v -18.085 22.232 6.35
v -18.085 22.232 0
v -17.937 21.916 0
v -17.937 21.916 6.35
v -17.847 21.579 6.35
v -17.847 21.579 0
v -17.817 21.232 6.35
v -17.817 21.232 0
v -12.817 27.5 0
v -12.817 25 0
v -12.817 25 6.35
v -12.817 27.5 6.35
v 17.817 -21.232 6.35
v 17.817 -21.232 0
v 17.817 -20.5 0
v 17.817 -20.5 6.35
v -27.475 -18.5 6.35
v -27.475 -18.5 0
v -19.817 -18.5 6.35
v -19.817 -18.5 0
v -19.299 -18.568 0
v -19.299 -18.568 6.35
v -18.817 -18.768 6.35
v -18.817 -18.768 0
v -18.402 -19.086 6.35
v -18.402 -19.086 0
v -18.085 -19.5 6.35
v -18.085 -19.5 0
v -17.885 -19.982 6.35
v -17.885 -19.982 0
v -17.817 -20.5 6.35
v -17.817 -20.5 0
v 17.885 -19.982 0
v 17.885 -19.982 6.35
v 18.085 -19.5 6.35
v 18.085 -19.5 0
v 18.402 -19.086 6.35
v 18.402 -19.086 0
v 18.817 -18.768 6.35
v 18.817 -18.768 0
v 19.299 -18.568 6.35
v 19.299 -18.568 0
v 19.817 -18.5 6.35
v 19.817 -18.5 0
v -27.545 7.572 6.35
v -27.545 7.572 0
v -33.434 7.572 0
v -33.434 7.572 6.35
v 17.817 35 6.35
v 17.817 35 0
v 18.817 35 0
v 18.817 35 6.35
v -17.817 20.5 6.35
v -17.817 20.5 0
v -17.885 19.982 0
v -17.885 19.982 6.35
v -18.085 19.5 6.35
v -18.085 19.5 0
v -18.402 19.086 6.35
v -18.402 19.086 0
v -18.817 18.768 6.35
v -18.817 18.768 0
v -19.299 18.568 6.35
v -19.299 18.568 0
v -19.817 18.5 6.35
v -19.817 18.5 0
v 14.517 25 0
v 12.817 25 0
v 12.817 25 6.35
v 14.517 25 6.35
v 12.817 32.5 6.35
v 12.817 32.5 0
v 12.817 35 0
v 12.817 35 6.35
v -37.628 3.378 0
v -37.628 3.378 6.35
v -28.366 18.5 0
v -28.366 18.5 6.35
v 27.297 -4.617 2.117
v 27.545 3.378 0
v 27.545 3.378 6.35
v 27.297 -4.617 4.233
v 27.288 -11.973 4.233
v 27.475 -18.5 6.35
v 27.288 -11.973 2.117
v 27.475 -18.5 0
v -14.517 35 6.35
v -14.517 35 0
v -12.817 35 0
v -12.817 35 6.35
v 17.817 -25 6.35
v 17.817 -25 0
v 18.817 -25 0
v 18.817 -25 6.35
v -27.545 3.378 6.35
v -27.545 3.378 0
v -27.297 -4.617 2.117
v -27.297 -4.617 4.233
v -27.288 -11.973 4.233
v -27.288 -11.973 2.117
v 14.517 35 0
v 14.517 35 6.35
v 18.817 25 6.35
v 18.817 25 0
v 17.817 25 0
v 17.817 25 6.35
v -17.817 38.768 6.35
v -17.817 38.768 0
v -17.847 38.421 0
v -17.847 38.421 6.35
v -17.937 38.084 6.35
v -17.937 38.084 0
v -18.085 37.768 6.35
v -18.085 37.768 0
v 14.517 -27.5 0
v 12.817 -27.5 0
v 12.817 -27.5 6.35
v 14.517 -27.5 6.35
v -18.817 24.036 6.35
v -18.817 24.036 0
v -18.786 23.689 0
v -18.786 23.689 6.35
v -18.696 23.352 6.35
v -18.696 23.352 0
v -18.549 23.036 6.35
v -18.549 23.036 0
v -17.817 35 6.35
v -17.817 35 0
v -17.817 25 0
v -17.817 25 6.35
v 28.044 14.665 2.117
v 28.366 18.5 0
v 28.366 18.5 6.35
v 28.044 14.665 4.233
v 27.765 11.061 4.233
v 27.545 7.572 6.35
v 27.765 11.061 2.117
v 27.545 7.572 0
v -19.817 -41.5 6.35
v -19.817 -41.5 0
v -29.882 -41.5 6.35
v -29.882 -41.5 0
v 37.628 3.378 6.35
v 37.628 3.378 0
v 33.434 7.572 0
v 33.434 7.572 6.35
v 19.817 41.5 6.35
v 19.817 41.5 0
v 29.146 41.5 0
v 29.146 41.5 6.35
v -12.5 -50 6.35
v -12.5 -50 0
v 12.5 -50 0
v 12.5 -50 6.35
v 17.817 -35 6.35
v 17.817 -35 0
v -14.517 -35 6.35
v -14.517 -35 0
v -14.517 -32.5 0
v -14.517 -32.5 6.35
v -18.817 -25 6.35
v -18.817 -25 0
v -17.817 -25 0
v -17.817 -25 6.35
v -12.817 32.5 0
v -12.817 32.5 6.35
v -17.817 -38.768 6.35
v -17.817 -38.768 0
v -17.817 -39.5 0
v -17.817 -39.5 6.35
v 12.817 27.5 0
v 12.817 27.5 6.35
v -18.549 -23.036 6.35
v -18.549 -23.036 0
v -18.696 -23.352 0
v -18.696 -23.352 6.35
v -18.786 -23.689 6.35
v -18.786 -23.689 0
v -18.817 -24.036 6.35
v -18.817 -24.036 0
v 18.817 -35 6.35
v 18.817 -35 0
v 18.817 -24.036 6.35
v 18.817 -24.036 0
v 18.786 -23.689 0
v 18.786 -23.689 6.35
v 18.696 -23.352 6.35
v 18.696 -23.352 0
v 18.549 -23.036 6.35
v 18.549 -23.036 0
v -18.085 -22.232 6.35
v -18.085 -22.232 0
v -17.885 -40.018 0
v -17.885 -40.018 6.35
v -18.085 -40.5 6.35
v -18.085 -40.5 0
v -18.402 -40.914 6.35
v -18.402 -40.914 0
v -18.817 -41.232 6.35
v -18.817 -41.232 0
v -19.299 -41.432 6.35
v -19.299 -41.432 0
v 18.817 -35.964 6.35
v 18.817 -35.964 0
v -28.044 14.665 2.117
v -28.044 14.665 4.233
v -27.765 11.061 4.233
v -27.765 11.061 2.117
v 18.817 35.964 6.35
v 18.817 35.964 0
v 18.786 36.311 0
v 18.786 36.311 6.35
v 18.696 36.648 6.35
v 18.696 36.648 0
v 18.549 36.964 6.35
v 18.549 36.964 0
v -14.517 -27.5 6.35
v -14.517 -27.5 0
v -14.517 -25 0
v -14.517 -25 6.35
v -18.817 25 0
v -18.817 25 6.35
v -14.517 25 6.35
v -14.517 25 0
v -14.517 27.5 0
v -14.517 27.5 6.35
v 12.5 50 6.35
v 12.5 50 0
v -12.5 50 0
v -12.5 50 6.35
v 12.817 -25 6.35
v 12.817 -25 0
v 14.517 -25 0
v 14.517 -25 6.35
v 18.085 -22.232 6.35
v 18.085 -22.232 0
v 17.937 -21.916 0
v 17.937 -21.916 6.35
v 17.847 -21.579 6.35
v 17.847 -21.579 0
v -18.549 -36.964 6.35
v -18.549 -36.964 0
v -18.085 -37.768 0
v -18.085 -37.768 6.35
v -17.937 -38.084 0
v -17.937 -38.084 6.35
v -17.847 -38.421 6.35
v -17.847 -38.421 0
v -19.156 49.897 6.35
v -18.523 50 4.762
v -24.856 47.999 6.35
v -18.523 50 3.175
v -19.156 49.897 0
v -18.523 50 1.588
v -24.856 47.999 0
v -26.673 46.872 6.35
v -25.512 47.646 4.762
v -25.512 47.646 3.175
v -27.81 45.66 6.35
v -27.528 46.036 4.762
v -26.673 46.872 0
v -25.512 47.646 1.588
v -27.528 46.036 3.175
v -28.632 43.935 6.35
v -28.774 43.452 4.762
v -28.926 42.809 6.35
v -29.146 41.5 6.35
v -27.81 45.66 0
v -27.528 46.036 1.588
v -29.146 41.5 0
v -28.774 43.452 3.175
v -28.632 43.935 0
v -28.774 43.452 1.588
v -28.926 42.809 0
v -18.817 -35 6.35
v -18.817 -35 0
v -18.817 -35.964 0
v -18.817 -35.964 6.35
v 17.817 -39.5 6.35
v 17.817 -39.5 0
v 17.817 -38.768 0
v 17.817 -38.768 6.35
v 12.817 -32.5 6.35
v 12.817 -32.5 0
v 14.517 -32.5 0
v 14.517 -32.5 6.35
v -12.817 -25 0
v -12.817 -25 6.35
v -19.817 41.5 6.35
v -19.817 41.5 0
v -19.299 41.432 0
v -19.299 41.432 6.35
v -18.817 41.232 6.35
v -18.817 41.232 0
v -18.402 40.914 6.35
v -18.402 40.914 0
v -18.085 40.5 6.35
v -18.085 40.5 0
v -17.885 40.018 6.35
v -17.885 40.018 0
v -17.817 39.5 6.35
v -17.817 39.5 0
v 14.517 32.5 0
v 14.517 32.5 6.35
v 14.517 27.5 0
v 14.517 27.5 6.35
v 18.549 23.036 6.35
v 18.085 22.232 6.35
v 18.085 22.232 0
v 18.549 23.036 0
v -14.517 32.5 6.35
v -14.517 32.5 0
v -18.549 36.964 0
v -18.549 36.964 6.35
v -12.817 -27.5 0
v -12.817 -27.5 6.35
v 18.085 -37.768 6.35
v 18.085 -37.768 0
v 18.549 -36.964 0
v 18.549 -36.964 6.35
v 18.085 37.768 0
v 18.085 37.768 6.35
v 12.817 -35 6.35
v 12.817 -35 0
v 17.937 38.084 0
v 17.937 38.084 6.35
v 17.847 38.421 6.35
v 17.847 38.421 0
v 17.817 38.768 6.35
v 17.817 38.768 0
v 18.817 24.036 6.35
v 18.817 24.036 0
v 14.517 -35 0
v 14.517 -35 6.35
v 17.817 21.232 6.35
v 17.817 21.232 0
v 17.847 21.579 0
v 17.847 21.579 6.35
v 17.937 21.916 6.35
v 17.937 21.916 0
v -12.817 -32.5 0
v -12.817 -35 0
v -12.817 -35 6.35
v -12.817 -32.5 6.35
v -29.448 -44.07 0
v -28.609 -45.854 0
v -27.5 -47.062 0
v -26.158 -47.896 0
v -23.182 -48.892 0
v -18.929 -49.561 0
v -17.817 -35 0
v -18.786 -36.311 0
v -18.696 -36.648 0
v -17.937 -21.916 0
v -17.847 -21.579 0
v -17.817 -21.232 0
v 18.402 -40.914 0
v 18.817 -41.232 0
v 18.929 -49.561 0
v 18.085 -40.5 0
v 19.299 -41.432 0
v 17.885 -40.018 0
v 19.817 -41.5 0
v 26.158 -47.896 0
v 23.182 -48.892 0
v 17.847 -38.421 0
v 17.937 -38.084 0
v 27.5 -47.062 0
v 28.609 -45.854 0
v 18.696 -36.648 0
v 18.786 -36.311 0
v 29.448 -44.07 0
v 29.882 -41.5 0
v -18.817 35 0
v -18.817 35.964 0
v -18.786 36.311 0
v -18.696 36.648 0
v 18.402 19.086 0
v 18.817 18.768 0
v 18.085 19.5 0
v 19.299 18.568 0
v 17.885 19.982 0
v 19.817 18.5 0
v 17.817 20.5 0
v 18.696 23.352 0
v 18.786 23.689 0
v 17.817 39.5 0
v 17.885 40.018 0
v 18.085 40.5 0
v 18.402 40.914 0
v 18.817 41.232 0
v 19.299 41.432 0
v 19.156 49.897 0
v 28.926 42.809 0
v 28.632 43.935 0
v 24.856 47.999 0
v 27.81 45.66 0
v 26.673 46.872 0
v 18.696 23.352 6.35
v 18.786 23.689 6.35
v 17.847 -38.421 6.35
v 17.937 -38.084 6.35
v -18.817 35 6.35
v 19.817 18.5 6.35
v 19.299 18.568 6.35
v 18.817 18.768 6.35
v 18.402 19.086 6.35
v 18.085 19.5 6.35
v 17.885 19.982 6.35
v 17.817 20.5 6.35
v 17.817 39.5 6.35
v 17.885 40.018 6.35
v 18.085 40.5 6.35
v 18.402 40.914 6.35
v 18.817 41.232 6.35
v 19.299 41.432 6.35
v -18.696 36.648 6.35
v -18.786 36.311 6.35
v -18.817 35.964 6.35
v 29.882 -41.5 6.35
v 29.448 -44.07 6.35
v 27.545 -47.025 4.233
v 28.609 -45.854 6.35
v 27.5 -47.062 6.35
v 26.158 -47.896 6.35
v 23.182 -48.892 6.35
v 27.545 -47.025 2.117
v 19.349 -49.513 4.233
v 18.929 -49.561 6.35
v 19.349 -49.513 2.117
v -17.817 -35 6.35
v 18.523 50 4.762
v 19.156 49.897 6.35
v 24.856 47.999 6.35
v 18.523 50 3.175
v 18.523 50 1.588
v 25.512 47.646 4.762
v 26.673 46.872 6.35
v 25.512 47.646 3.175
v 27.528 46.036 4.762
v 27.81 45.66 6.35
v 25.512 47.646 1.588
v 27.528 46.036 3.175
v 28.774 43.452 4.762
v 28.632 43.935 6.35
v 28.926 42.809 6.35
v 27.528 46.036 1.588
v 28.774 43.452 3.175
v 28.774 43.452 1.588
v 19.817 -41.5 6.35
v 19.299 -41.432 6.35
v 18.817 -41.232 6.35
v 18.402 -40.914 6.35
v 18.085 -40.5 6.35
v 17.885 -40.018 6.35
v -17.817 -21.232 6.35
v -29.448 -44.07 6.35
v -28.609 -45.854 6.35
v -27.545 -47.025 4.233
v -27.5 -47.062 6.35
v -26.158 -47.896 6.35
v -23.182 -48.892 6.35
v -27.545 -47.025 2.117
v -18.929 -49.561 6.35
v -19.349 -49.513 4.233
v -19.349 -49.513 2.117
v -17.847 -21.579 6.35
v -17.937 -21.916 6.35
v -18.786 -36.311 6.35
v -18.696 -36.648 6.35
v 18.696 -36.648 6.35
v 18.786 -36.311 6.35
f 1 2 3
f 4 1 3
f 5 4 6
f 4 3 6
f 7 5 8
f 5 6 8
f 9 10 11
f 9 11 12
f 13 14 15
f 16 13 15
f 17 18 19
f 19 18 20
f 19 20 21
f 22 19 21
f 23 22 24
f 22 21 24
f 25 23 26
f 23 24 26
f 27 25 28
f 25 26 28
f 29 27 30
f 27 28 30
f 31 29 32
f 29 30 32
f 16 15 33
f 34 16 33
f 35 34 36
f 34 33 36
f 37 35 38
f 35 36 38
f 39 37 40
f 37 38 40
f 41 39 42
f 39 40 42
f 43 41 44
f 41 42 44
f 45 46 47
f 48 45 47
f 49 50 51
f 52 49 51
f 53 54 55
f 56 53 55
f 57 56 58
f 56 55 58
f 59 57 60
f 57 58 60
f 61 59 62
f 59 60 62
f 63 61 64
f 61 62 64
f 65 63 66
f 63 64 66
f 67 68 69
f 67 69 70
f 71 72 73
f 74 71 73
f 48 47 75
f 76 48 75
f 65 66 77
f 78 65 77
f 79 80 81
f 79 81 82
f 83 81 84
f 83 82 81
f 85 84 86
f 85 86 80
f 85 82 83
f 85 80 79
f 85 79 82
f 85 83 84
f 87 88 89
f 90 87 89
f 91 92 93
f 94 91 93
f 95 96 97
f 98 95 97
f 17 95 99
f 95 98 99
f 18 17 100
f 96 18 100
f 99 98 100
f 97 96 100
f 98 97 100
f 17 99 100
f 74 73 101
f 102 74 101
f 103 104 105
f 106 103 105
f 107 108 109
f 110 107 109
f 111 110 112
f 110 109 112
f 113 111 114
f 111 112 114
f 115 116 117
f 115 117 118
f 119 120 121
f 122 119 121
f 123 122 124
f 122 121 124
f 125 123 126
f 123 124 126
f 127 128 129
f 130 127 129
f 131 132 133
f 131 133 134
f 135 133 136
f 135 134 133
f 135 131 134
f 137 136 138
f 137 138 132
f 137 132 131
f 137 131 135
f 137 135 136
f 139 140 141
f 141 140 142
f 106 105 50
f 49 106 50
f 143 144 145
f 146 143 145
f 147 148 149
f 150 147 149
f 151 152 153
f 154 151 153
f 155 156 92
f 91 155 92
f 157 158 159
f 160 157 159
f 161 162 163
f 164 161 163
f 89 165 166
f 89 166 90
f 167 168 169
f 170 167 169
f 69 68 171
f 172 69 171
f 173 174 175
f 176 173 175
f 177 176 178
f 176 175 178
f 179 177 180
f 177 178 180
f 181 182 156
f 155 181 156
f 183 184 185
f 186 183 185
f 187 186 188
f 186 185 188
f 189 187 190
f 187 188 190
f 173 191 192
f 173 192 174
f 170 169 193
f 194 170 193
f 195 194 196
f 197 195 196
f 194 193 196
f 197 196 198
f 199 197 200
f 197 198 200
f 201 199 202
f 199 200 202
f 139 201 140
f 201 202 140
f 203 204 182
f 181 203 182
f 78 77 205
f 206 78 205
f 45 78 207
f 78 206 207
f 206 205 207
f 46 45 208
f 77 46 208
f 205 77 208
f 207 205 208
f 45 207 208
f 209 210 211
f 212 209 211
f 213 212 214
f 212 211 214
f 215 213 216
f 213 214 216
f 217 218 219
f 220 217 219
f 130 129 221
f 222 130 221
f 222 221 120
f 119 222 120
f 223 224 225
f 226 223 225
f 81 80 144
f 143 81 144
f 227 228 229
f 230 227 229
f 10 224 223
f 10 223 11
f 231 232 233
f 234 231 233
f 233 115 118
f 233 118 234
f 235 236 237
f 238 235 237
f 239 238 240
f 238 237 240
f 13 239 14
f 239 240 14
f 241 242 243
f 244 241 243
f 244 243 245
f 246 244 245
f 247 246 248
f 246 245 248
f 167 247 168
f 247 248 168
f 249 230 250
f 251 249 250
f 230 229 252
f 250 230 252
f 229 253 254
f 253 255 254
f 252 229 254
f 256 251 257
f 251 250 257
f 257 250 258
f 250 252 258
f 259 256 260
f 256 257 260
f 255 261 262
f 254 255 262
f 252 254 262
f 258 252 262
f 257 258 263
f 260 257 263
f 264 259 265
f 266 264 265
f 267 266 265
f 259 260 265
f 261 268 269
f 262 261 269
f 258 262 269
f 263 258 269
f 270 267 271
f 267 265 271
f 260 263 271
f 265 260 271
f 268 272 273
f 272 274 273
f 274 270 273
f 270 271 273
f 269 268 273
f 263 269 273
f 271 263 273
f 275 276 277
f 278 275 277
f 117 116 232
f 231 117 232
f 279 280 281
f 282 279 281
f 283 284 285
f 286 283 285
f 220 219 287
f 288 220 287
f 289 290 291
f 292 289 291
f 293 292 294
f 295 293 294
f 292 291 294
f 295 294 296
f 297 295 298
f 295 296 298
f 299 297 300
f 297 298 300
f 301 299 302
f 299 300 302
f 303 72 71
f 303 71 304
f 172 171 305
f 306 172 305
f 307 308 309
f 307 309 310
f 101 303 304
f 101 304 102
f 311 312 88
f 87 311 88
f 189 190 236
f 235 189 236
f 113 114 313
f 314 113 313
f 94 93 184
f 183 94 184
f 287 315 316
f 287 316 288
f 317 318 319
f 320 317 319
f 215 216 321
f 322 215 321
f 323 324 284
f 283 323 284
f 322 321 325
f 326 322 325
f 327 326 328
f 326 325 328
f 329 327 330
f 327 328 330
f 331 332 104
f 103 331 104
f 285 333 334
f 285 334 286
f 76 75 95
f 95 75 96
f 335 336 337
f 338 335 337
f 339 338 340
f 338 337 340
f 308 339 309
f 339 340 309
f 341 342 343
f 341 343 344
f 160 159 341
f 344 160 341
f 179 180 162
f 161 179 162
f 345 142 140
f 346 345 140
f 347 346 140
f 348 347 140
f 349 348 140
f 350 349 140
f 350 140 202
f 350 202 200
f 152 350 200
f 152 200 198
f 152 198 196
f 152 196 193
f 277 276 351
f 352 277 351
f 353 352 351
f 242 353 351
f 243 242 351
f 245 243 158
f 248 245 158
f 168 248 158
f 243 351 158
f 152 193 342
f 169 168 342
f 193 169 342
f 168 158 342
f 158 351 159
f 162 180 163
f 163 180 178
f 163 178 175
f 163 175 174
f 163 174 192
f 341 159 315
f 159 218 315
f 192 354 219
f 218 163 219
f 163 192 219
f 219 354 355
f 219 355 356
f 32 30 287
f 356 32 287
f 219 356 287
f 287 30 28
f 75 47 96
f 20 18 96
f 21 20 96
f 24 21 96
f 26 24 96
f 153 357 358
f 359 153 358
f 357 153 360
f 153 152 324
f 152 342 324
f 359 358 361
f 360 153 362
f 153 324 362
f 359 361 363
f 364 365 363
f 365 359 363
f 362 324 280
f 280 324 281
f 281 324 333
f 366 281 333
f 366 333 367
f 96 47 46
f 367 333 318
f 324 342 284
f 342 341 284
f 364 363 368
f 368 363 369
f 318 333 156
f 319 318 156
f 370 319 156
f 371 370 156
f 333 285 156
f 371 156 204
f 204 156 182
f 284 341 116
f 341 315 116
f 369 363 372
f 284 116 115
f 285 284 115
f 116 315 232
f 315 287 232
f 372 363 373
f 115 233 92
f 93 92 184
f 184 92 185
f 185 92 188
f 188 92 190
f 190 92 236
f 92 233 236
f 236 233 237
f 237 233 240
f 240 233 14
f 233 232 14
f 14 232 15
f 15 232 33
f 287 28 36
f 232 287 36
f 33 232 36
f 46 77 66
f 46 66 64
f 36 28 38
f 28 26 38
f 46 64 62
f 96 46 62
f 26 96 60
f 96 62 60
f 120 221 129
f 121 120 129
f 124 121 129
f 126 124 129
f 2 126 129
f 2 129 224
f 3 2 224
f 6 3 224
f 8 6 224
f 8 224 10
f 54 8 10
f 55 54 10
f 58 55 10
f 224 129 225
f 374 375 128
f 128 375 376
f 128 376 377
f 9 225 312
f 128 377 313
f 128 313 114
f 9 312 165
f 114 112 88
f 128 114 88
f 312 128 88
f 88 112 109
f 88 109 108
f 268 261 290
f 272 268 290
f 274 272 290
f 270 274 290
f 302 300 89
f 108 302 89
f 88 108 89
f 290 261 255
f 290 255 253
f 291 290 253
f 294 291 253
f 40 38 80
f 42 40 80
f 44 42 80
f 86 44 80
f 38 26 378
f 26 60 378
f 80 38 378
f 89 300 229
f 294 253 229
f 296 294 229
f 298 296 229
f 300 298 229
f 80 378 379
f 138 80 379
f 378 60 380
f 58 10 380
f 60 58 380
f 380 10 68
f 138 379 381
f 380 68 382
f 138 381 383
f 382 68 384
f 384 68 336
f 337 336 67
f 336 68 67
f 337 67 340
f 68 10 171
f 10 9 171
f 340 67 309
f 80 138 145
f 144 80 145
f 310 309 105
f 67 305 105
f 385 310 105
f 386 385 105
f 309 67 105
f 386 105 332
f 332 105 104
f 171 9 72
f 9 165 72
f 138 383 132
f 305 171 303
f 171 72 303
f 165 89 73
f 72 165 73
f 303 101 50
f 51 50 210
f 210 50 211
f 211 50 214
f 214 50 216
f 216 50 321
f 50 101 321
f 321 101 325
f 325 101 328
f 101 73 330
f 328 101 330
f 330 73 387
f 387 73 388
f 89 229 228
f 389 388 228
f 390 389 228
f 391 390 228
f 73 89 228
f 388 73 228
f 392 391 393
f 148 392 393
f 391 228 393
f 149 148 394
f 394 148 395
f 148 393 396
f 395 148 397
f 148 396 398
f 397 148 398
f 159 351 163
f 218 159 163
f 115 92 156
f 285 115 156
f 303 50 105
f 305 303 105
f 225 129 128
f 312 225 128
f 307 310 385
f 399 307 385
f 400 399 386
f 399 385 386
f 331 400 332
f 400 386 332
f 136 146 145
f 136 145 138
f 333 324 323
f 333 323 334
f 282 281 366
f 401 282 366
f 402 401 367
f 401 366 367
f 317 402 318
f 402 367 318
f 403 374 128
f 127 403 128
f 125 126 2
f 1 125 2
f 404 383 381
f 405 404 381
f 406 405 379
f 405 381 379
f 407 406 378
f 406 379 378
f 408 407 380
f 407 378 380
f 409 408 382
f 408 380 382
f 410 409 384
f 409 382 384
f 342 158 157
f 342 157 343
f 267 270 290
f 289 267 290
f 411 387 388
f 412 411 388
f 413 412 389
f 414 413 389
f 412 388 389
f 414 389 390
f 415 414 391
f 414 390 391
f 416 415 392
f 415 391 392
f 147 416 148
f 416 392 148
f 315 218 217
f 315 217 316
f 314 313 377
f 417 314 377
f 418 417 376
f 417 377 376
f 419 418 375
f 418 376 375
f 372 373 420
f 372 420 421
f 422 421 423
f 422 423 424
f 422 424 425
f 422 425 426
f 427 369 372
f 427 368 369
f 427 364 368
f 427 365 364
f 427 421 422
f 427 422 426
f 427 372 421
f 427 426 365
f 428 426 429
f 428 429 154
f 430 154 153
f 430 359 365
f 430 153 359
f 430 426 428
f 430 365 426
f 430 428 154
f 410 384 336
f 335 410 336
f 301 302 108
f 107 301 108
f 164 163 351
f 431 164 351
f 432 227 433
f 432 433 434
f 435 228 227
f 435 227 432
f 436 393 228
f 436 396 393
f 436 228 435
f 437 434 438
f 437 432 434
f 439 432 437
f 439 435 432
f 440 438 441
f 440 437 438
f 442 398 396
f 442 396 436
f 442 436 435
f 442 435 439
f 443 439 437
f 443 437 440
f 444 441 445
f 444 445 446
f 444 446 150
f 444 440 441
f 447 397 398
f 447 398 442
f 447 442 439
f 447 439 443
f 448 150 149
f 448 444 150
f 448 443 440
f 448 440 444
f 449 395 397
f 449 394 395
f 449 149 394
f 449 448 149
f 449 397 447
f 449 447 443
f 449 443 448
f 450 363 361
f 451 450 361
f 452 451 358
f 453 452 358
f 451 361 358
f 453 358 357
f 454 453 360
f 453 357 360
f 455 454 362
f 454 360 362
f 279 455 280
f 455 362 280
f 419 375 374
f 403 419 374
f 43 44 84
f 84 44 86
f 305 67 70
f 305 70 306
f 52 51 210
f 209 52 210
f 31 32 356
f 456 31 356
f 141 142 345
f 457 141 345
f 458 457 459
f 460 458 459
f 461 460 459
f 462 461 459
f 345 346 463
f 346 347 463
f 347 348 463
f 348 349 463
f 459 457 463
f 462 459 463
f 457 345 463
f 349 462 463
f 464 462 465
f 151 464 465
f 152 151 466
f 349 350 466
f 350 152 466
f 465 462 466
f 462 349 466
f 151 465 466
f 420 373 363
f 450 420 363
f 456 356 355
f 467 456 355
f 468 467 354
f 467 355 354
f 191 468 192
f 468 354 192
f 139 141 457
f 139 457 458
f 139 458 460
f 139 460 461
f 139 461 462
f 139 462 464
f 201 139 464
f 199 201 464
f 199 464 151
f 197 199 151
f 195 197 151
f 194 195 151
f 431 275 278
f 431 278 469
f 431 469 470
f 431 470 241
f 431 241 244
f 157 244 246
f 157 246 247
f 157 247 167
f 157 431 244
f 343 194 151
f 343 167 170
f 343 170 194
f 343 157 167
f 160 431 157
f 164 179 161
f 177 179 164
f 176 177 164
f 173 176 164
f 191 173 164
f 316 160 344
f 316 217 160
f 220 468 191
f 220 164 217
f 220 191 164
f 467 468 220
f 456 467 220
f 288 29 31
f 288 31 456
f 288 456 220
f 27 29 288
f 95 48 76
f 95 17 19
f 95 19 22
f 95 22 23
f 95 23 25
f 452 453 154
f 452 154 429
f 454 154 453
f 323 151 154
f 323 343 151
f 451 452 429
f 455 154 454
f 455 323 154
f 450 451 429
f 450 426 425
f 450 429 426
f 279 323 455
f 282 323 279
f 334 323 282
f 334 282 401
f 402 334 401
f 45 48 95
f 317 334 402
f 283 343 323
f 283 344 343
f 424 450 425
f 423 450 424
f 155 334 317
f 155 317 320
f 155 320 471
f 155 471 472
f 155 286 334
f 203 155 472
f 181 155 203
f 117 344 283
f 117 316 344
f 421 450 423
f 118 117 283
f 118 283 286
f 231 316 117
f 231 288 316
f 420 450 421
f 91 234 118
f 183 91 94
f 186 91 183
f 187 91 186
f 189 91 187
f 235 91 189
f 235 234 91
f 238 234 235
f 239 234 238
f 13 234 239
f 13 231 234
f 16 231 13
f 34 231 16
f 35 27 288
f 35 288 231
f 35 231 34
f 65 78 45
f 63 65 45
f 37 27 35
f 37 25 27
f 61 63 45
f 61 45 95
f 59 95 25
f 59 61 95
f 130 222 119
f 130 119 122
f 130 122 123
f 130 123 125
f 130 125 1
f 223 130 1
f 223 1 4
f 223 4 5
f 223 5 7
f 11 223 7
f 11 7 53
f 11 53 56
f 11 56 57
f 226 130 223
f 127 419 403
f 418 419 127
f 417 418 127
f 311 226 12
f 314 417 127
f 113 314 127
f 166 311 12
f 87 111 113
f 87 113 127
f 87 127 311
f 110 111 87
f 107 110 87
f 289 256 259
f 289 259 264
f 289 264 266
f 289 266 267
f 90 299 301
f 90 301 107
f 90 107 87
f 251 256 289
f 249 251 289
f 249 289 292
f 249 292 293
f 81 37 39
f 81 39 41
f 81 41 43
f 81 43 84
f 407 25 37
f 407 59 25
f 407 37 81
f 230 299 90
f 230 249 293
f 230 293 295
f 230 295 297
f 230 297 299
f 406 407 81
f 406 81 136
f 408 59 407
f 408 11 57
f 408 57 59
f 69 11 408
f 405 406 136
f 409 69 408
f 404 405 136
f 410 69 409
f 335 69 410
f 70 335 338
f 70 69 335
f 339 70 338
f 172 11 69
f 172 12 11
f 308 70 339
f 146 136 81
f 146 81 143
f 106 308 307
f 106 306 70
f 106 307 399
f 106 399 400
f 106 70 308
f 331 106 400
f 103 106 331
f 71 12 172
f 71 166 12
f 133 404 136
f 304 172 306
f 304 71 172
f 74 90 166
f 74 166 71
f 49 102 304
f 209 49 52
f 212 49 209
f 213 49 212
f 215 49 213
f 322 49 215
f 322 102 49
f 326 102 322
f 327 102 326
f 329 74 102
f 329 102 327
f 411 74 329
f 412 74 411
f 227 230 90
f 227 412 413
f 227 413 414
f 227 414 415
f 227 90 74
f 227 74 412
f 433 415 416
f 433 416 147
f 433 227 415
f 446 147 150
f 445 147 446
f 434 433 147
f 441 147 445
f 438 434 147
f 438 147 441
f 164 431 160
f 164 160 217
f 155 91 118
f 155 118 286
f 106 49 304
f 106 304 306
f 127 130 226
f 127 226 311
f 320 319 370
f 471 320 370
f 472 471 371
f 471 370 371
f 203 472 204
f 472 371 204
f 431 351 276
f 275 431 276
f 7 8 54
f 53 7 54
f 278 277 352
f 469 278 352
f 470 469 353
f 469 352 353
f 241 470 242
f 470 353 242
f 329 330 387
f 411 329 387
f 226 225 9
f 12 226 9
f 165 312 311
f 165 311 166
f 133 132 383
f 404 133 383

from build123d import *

# Parameters (mm, degrees)
F1_W     = 1.7
F1_H     = 2.5
F2_DEPTH = 6.35


# Not quite as in the source:
# - a feature names something its author has since deleted; it is built from what else it names


with BuildPart() as f2:
    # F1 (on Top) → F2 (new body)
    with BuildSketch(Plane.XY):
        with BuildLine():
            add(Edge.make_bspline(
                [(-28.3662502266, 18.5), (-28.0282859794, 14.509768022), (-27.7307294384, 11.0425580188), (-27.5446102023, 7.5721158646)],
                knots=[0.8198316729, 0.8198316729, 0.8198316729, 0.8198316729, 1, 1, 1, 1], degree=3))
            Line((-27.5446102023, 7.5721158646), (-33.4338024259, 7.5721158646))
            Line((-33.4338024259, 7.5721158646), (-37.6275889575, 3.3783284016))
            Line((-37.6275889575, 3.3783284016), (-27.5446102023, 3.3783284016))
            add(Edge.make_bspline(
                [(-27.5446102023, 3.3783284016), (-27.1626822342, -4.8739274421), (-27.2042266074, -12.4503556404), (-27.4753266797, -18.5)],
                knots=[0, 0, 0, 0, 0.2300812655, 0.2300812655, 0.2300812655, 0.2300812655], degree=3))
            Line((-27.4753266797, -18.5), (-19.8166404351, -18.5))
            ThreePointArc((-19.8166404351, -18.5), (-18.4024268727, -19.0857864376), (-17.8166404351, -20.5))
            Line((-17.8166404351, -20.5), (-17.8166404351, -21.2320508076))
            ThreePointArc((-17.8166404351, -21.2320508076), (-17.8847887825, -21.7496888978), (-18.0845896275, -22.2320508076))
            Line((-18.0845896275, -22.2320508076), (-18.5486912426, -23.0358983849))
            ThreePointArc((-18.5486912426, -23.0358983849), (-18.7484920877, -23.5182602947), (-18.8166404351, -24.0358983849))
            Line((-18.8166404351, -24.0358983849), (-18.8166404351, -25))
            Line((-18.8166404351, -25), (-17.8166404351, -25))
            Line((-17.8166404351, -25), (-17.8166404351, -30))
            Line((-17.8166404351, -30), (-17.8166404351, -35))
            Line((-17.8166404351, -35), (-18.8166404351, -35))
            Line((-18.8166404351, -35), (-18.8166404351, -35.9641016151))
            ThreePointArc((-18.8166404351, -35.9641016151), (-18.7484920877, -36.4817397053), (-18.5486912426, -36.9641016151))
            Line((-18.5486912426, -36.9641016151), (-18.0845896275, -37.7679491924))
            ThreePointArc((-18.0845896275, -37.7679491924), (-17.8847887825, -38.2503111022), (-17.8166404351, -38.7679491924))
            Line((-17.8166404351, -38.7679491924), (-17.8166404351, -39.5))
            ThreePointArc((-17.8166404351, -39.5), (-18.4024268727, -40.9142135624), (-19.8166404351, -41.5))
            Line((-19.8166404351, -41.5), (-29.8822661517, -41.5))
            add(Edge.make_bspline(
                [(-29.8822661517, -41.5), (-29.7521644168, -43.7295834581), (-28.3532415217, -48.2000718925), (-19.0537112462, -49.6748582384), (-14.8830911746, -49.9236971311), (-12.5, -50)],
                knots=[0.5930961397, 0.5930961397, 0.5930961397, 0.5930961397, 0.7144689073, 0.865116052, 1, 1, 1, 1], degree=3))
            Line((-12.5, -50), (12.5, -50))
            add(Edge.make_bspline(
                [(29.8822661517, -41.5), (29.7521644168, -43.7295834581), (28.3532415217, -48.2000718925), (19.0537112462, -49.6748582384), (14.8830911746, -49.9236971311), (12.5, -50)],
                knots=[0.5930961397, 0.5930961397, 0.5930961397, 0.5930961397, 0.7144689073, 0.865116052, 1, 1, 1, 1], degree=3))
            Line((29.8822661517, -41.5), (19.8166404351, -41.5))
            ThreePointArc((19.8166404351, -41.5), (18.4024268727, -40.9142135624), (17.8166404351, -39.5))
            Line((17.8166404351, -39.5), (17.8166404351, -38.7679491924))
            ThreePointArc((17.8166404351, -38.7679491924), (17.8847887825, -38.2503111022), (18.0845896275, -37.7679491924))
            Line((18.0845896275, -37.7679491924), (18.5486912426, -36.9641016151))
            ThreePointArc((18.5486912426, -36.9641016151), (18.7484920877, -36.4817397053), (18.8166404351, -35.9641016151))
            Line((18.8166404351, -35.9641016151), (18.8166404351, -35))
            Line((18.8166404351, -35), (17.8166404351, -35))
            Line((17.8166404351, -35), (17.8166404351, -30))
            Line((17.8166404351, -30), (17.8166404351, -25))
            Line((17.8166404351, -25), (18.8166404351, -25))
            Line((18.8166404351, -25), (18.8166404351, -24.0358983849))
            ThreePointArc((18.8166404351, -24.0358983849), (18.7484920877, -23.5182602947), (18.5486912426, -23.0358983849))
            Line((18.5486912426, -23.0358983849), (18.0845896275, -22.2320508076))
            ThreePointArc((18.0845896275, -22.2320508076), (17.8847887825, -21.7496888978), (17.8166404351, -21.2320508076))
            Line((17.8166404351, -21.2320508076), (17.8166404351, -20.5))
            ThreePointArc((17.8166404351, -20.5), (18.4024268727, -19.0857864376), (19.8166404351, -18.5))
            Line((19.8166404351, -18.5), (27.4753266797, -18.5))
            add(Edge.make_bspline(
                [(27.5446102023, 3.3783284016), (27.1626822342, -4.8739274421), (27.2042266074, -12.4503556404), (27.4753266797, -18.5)],
                knots=[0, 0, 0, 0, 0.2300812655, 0.2300812655, 0.2300812655, 0.2300812655], degree=3))
            Line((27.5446102023, 3.3783284016), (37.6275889575, 3.3783284016))
            Line((37.6275889575, 3.3783284016), (33.4338024259, 7.5721158646))
            Line((33.4338024259, 7.5721158646), (27.5446102023, 7.5721158646))
            add(Edge.make_bspline(
                [(28.3662502266, 18.5), (28.0282859794, 14.509768022), (27.7307294384, 11.0425580188), (27.5446102023, 7.5721158646)],
                knots=[0.8198316729, 0.8198316729, 0.8198316729, 0.8198316729, 1, 1, 1, 1], degree=3))
            Line((28.3662502266, 18.5), (19.8166404351, 18.5))
            ThreePointArc((19.8166404351, 18.5), (18.4024268727, 19.0857864376), (17.8166404351, 20.5))
            Line((17.8166404351, 20.5), (17.8166404351, 21.2320508076))
            ThreePointArc((17.8166404351, 21.2320508076), (17.8847887825, 21.7496888978), (18.0845896275, 22.2320508076))
            Line((18.0845896275, 22.2320508076), (18.5486912426, 23.0358983849))
            ThreePointArc((18.5486912426, 23.0358983849), (18.7484920877, 23.5182602947), (18.8166404351, 24.0358983849))
            Line((18.8166404351, 24.0358983849), (18.8166404351, 25))
            Line((18.8166404351, 25), (17.8166404351, 25))
            Line((17.8166404351, 25), (17.8166404351, 30))
            Line((17.8166404351, 30), (17.8166404351, 35))
            Line((17.8166404351, 35), (18.8166404351, 35))
            Line((18.8166404351, 35), (18.8166404351, 35.9641016151))
            ThreePointArc((18.8166404351, 35.9641016151), (18.7484920877, 36.4817397053), (18.5486912426, 36.9641016151))
            Line((18.5486912426, 36.9641016151), (18.0845896275, 37.7679491924))
            ThreePointArc((18.0845896275, 37.7679491924), (17.8847887825, 38.2503111022), (17.8166404351, 38.7679491924))
            Line((17.8166404351, 38.7679491924), (17.8166404351, 39.5))
            ThreePointArc((17.8166404351, 39.5), (18.4024268727, 40.9142135624), (19.8166404351, 41.5))
            Line((19.8166404351, 41.5), (29.1458233545, 41.5))
            add(Edge.make_bspline(
                [(12.5, 50), (14.4284018661, 50.1560744709), (18.4905820055, 50.4849939867), (25.8883531216, 47.9554177216), (28.4554923405, 45.4024265549), (29.0501411907, 42.2200084299), (29.1458233545, 41.5)],
                knots=[0, 0, 0, 0, 0.1539827529, 0.3243842758, 0.4690112538, 0.5065425276, 0.5065425276, 0.5065425276, 0.5065425276], degree=3))
            Line((12.5, 50), (-12.5, 50))
            add(Edge.make_bspline(
                [(-12.5, 50), (-14.4284018661, 50.1560744709), (-18.4905820055, 50.4849939867), (-25.8883531216, 47.9554177216), (-28.4554923405, 45.4024265549), (-29.0501411907, 42.2200084299), (-29.1458233545, 41.5)],
                knots=[0, 0, 0, 0, 0.1539827529, 0.3243842758, 0.4690112538, 0.5065425276, 0.5065425276, 0.5065425276, 0.5065425276], degree=3))
            Line((-29.1458233545, 41.5), (-19.8166404351, 41.5))
            ThreePointArc((-19.8166404351, 41.5), (-18.4024268727, 40.9142135624), (-17.8166404351, 39.5))
            Line((-17.8166404351, 39.5), (-17.8166404351, 38.7679491924))
            ThreePointArc((-17.8166404351, 38.7679491924), (-17.8847887825, 38.2503111022), (-18.0845896275, 37.7679491924))
            Line((-18.0845896275, 37.7679491924), (-18.5486912426, 36.9641016151))
            ThreePointArc((-18.5486912426, 36.9641016151), (-18.7484920877, 36.4817397053), (-18.8166404351, 35.9641016151))
            Line((-18.8166404351, 35.9641016151), (-18.8166404351, 35))
            Line((-18.8166404351, 35), (-17.8166404351, 35))
            Line((-17.8166404351, 35), (-17.8166404351, 30))
            Line((-17.8166404351, 30), (-17.8166404351, 25))
            Line((-17.8166404351, 25), (-18.8166404351, 25))
            Line((-18.8166404351, 25), (-18.8166404351, 24.0358983849))
            ThreePointArc((-18.8166404351, 24.0358983849), (-18.7484920877, 23.5182602947), (-18.5486912426, 23.0358983849))
            Line((-18.5486912426, 23.0358983849), (-18.0845896275, 22.2320508076))
            ThreePointArc((-18.0845896275, 22.2320508076), (-17.8847887825, 21.7496888978), (-17.8166404351, 21.2320508076))
            Line((-17.8166404351, 21.2320508076), (-17.8166404351, 20.5))
            ThreePointArc((-17.8166404351, 20.5), (-18.4024268727, 19.0857864376), (-19.8166404351, 18.5))
            Line((-19.8166404351, 18.5), (-28.3662502266, 18.5))
        make_face()
        with Locations((-13.6666404351, -33.75)):
            Rectangle(F1_W, F1_H, mode=Mode.SUBTRACT)
        with Locations((-13.6666404351, -26.25)):
            Rectangle(F1_W, F1_H, mode=Mode.SUBTRACT)
        with Locations((13.6666404351, -33.75)):
            Rectangle(F1_W, F1_H, mode=Mode.SUBTRACT)
        with Locations((13.6666404351, -26.25)):
            Rectangle(F1_W, F1_H, mode=Mode.SUBTRACT)
        with Locations((-13.6666404351, 26.25)):
            Rectangle(F1_W, F1_H, mode=Mode.SUBTRACT)
        with Locations((-13.6666404351, 33.75)):
            Rectangle(F1_W, F1_H, mode=Mode.SUBTRACT)
        with Locations((13.6666404351, 26.25)):
            Rectangle(F1_W, F1_H, mode=Mode.SUBTRACT)
        with Locations((13.6666404351, 33.75)):
            Rectangle(F1_W, F1_H, mode=Mode.SUBTRACT)
    extrude(amount=F2_DEPTH)


solid = f2.part
